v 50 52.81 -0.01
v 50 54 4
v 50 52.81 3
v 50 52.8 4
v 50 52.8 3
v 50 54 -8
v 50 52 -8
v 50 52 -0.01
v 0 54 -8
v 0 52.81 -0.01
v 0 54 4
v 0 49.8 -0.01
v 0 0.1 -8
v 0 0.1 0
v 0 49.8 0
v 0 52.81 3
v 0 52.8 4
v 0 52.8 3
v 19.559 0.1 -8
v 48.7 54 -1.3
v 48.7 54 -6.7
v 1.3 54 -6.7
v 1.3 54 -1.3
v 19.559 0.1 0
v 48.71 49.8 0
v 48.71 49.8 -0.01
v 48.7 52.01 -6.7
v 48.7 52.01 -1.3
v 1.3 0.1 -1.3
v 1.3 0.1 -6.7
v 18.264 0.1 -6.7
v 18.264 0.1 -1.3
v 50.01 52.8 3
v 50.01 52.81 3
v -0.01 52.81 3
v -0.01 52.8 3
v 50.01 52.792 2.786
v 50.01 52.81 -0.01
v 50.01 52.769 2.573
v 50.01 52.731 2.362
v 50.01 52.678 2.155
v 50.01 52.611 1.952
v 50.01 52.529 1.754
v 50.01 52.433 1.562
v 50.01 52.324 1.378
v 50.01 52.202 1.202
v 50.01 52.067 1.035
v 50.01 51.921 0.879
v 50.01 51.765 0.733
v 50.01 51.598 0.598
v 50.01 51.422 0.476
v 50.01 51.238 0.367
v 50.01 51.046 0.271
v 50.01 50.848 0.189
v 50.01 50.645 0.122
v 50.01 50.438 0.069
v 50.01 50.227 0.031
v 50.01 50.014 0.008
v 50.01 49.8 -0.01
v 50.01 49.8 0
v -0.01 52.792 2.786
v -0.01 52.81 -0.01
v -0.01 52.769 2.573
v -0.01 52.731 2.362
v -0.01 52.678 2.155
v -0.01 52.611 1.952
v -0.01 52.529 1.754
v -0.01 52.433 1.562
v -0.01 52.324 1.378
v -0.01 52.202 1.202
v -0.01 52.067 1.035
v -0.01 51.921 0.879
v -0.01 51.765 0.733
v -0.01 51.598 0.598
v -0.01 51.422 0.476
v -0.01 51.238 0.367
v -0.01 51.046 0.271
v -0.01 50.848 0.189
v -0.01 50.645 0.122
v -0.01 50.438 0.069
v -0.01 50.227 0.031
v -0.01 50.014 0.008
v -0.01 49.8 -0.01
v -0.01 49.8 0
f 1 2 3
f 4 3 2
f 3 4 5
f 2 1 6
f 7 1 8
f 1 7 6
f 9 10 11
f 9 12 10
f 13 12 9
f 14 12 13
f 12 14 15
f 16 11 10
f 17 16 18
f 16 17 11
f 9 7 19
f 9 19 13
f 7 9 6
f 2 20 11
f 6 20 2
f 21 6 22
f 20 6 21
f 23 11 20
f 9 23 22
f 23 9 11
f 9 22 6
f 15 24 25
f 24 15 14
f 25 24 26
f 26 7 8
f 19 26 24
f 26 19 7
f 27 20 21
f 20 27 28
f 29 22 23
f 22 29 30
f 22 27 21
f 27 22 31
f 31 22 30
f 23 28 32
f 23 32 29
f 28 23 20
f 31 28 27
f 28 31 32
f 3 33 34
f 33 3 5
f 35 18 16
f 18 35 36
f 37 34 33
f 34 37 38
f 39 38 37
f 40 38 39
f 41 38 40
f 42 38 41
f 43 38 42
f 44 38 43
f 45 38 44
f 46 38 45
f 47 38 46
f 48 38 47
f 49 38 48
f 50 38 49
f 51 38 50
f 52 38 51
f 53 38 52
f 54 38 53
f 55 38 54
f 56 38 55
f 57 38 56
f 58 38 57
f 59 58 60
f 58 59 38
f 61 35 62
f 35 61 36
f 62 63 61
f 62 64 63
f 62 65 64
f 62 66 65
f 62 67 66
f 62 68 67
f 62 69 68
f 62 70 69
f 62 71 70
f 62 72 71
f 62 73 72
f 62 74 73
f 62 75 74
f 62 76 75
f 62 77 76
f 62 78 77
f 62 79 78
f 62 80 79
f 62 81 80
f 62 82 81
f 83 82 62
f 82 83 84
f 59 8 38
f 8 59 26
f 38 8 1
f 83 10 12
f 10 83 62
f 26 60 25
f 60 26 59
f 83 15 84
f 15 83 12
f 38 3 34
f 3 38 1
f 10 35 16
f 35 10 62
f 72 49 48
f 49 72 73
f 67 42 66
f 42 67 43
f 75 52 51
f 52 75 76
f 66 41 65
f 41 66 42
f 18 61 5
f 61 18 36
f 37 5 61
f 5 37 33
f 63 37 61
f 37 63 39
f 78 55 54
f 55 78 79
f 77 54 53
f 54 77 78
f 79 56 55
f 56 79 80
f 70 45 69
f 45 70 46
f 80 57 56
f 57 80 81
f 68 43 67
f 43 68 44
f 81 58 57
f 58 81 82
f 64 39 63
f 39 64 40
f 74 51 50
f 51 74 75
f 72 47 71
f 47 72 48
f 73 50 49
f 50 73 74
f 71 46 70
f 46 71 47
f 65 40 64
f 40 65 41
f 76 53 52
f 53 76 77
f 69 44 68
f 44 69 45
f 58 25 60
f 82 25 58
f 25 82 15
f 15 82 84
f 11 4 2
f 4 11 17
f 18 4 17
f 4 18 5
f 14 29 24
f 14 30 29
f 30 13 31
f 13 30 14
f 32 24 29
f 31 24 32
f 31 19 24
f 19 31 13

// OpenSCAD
// file: duet3.scad
// duet3.scad
// controller board, simple model for mounting

// backside thru holes stick out 2.5 mm
// 4.3 radius clearance around the mounting holes for posts

// note the thermal vias mean the hot parts could be water cooled from
// the backside of the pcb, these are marked in pink

use <../Parts/tslot.scad>
use <../Parts/pi4.scad>


// locations for front rail of the shelf vs PCB zero
x0front=-30;
y0front=-20;


//----------------------------------
module duet3(
tol=0,
type=0
){
  
  // ---- PCB ----------
  difference(){
    // PCB,
    color("blue")
    cube([134+tol,140+tol,1.5+tol]);
    
    // mounting holes
    translate([4.5,4.5,-1])
    cylinder(r=4.2/2-tol/2,h=4,$fn=22);
    translate([4.5,140-4.5,-1])
    cylinder(r=4.2/2-tol/2,h=4,$fn=22);
    translate([134-4.5,4.5,-1])
    cylinder(r=4.2/2-tol/2,h=4,$fn=22);
    translate([134-4.5,140-4.5,-1])
    cylinder(r=4.2/2-tol/2,h=4,$fn=22);
  
  }
  
  // ------- driver connectors, tall enough to include wires
  translate([0,55,1.5])     // 0
  cube([11,16.5,21]);
  translate([0,84,1.5])     // 1
  cube([11,16.5,21]);
  translate([0,113,1.5])    // 2
  cube([11,16.5,21]);
  
  translate([32.5,55,1.5])     // 5
  cube([11,16.5,21]);
  translate([32.5,84,1.5])     // 4
  cube([11,16.5,21]);
  translate([32.5,113,1.5])    // 3
  cube([11,16.5,21]);

  // Out_x connectors
  translate([0,10,1.5])     // 3
  cube([11,8.5,21]);
  translate([0,22.3,1.5])     // 2
  cube([11,8.5,21]);
  translate([0,35.3,1.5])     // 1
  cube([11,8.5,21]);

  // ---------- bottom edge connectors
  translate([21,0,1.5])     // gnd v+
  cube([5.6,6.2,19]);
  color("red")
  translate([27.6,-0.3,1.5])     // reset button
  cube([4.6,4.6,2]);
  translate([34.4,0,1.5])     // external reset
  cube([5.6,6.2,19]);
  
  color("red")
  translate([47.8,0.5,1.5])     // SD card holder
  cube([15,15,2.3]);

  color("cyan")
  translate([48.6,-2.2,2.2])     // SD card holder
  cube([11.2,15.6,1.3]);
  
  color("red")
  translate([66.2,-0.5,1.5])     // micro USB type B
  cube([8.5,6,3.4]);
  
  color("red")
  translate([80.4,0.5,1.5])     // ethernet
  cube([16,21.5,13.5]);
  
  // --------- right corner I/O 0-8
  translate([99.3,0,1.5])     // i/o_0
  cube([6.5,13.2,19]);
  translate([109.3,0,1.5])     // i/o_1
  cube([6.5,13.2,19]);
  translate([118.5,0,1.5])     // i/o_2
  cube([6.5,13.2,19]);
  
  translate([99.3,14.5,1.5])     // i/o_3
  cube([6.5,13.2,19]);
  translate([109.3,14.5,1.5])     // i/o_4
  cube([6.5,13.2,19]);
  translate([118.5,14.5,1.5])     // i/o_5
  cube([6.5,13.2,19]);
  translate([127.8,14.5,1.5])     // i/o_6
  cube([6.5,13.2,19]);
  
  translate([118.5,28.6,1.5])     // i/o_7
  cube([6.5,13.2,19]);
  translate([127.8,28.6,1.5])     // i/o_8
  cube([6.5,13.2,19]);
  
  translate([111.2,28.6,1.5])     // DS_LED
  cube([6.5,10.2,19]);
  
  // ---------- ribbon cable
  color("green")
  translate([134-9.5,46,1.5])     // R-Pi ribbon
  cube([9.5,40.6,13.5]);
  
  color("red")
  translate([134-18.2,90,1.5])     // RJ45 for Canbus
  cube([18.2,14,13.3]);
  
  //------------ power block
  color("red")
  translate([65,122,1.5])     // Power block
  cube([58.5,16.2,18]);
  
  translate([65,115,1.5])     // fuse
  cube([15,6,18.5]);
  translate([96,115,1.5])     // fuse
  cube([15,6,18.5]);
  
  //-------- hot parts with thermal vias
  color("pink")
  translate([19,12,-0.2])     // Out_13D4184 40 volt N channel mosfet
  cube([7,6,2]);
  color("pink")
  translate([19,25,-0.2])     // Out_2 D4184 40 volt N channel mosfet
  cube([7,6,2]);
  color("pink")
  translate([19,37,-0.2])     // Out_1 D4184 40 volt N channel mosfet
  cube([7,6,2]);
  color("pink")
  
  translate([119.2,110.8,-0.2])     // Out_0 036N04L mosfet 40 volt 90 amp
  cube([6.5,6,2]);
  
  color("pink")
  translate([23.2,60.3,-0.2])     // Stepper driver 0, TMC 5160
  cube([5,5,2]);
  color("pink")
  translate([23.2,89.4,-0.2])     // Stepper driver 1
  cube([5,5,2]);
  color("pink")
  translate([23.2,118.5,-0.2])     // Stepper driver 2
  cube([5,5,2]);
  
  color("pink")
  translate([55.3,60.3,-0.2])     // Stepper driver 5
  cube([5,5,2]);
  color("pink")
  translate([55.3,89.4,-0.2])     // Stepper driver 4
  cube([5,5,2]);
  color("pink")
  translate([55.3,118.5,-0.2])     // Stepper driver 3
  cube([5,5,2]);
  
}
//---------------------------------
module duet3bracket(){
// this is the left side only, use a mirror to get right side

  difference(){
    // corners
    union(){
      color("pink")
      translate([-8,140-10,-4])
      cube([18,16,10]);

      color("green")
      translate([134-10,140-10,-4])
      cube([12,12,5.5]);

    }
    
    // cut out for the PCB
    tol=0.15;
    cube([134+tol,140+tol,1.5+tol]);

    // trim corner off bottom slot
    translate([11,109,-4])
    rotate([0,0,45])
    cube([20,20,11]);

    // trim corner off top slot
    translate([134-8,140-19,-4])
    rotate([0,0,45])
    cube([10,14,5.5]);
    
    // hole for M4x18 
    translate([129.5,135.5,-16.5])
    cylinder(r=2,h=18,$fn=22);

  }
  
  // left side vertical
  color("red")
  difference(){
    hull(){
      translate([-15,130,-24])
      cube([10,20,20]);

      color("green")
      translate([126,130,-14])
      cube([10,12,10]);
    }

    // hole for M4x18 
    translate([129.5,135.5,-16.5])
    cylinder(r=2,h=18,$fn=22);
    // cut a flat for M4 nylock 
    translate([123,129,-16.5])
    cube([14,14,5]);
    
    // indent the long walls 
    translate([-4,140,-24])
    rotate([1.7,85.8,0])
    cylinder(r1=3,r2=2,h=120,$fn=44);

    translate([12,140,-4])
    rotate([1.7,90,0])
    cylinder(r1=3,r2=2,h=104,$fn=44);

    translate([-4,150,-14])
    rotate([3,88,0])
    cylinder(r1=3,r2=2,h=120,$fn=44);

    translate([-4,130,-14])
    rotate([0,88,0])
    cylinder(r1=3,r2=2,h=120,$fn=44);

  }


  // foot
  difference(){
    translate([-16+1,130+1,-45+1])
    minkowski(){
      cube([10-2,30-2,65-2]);
      sphere(r=1,$fn=22);
    }

    // cut for back rail
    translate([x0front,y0front+30+120+15,-50])
    tslot1(type=1,len=100,tol=0.2);
    
    // cut for front M4 to rail
    translate([-20,145,11])
    rotate([0,90,0])
    cylinder(r=2,h=18,$fn=22);  

    // cut for back M4 to rail
    translate([-20,145,-35])
    rotate([0,90,0])
    cylinder(r=2,h=18,$fn=22);  

  }
}
//--------------------------------
module pi4bracket(){

  difference(){
    union(){
      // crossbar 
      color("cyan")
      translate([-8+1,-20+1,-45+1])
      minkowski(){
        cube([10-2,180-2,21-2]);
        sphere(r=1,$fn=22);
      }
      // extra base below the picase
      color("cyan")
      translate([-8,18,-35])
      cube([10,89+12,22]);
      // extra base below the posts
      color("blue")
      translate([-8,12,-26])
      cube([10,24,21]);
      // extra base below the posts
      color("blue")
      translate([-8,100,-26])
      cube([10,24,21]);
    }
    
    // cut for the posts
    post1(tol=0.15);
    
    // cut for M4x18 to back rail
    translate([-23,145,-35])
    rotate([0,90,0])
    cylinder(r=2,h=18,$fn=22);  

    // countersink for M4x18, otherwise not long enough
    translate([-5.5,145,-35])
    rotate([0,90,0])
    cylinder(r=7.5/2,h=7.6,$fn=22);  

    // cut for M4 to front rail
    translate([-23,-5,-35])
    rotate([0,90,0])
    cylinder(r=2,h=18,$fn=22);  

    // countersink for M4x18, otherwise not long enough
    translate([-5.5,-5,-35])
    rotate([0,90,0])
    cylinder(r=7.5/2,h=7.6,$fn=22);  
    
    // clearance for the ribbon cable
    translate([-2,52,-40])
    cube([4.5,55,40]);
    
  }
      
  
if(1){
  // front wall to hold picase
  difference(){
    color("green")
    translate([-6,18,-45])
    cube([24,89+12,5]);

    color("blue")
    translate([26,-6,-46])
    rotate([0,0,45])
    cube([30,30,8]);

    color("blue")
    translate([26,100,-46])
    rotate([0,0,45])
    cube([30,30,8]);
  }
}
  
}

//-----------------------------
module post1(tol=0){

    // back wall corner
  color("orange")
  translate([-8,18,-20])
  cube([65+tol,6+tol,9+tol]);
  color("orange")
  translate([-8,18,-14])
  cube([65+tol,12+tol,5+tol]);
  // tab to limit insertion
  color("pink")
  translate([2,12,-20])
  cube([6,6,11]);
    
}
//-------------------------------
module post2(tol=0){

  difference(){
    color("gray")
    translate([-8,113,-20])
    cube([65+tol,6+tol,9+tol]);
  
    color("blue")
    translate([20,111,-23])
    cube([20,16,5]);
  }
  color("pink")
  translate([-8,107,-14])
  cube([65+tol,12+tol,5+tol]);
  // tab to limit insertion
  color("orange")
  translate([2,118,-20])
  cube([6,6,11]);

}
//----------------------------------------------------------
module dcdc(tol=0){
  
  // main body
  difference(){
    cube([51.6+tol,28.3+tol,78.8+tol]);
    
    translate([-1,14,2.7])
    rotate([0,90,0])
    cylinder(r=1.5,h=8,$fn=22);
    translate([-1,14,69.3])
    rotate([0,90,0])
    cylinder(r=1.5,h=8,$fn=22);
    
  }
  // terminal block
  translate([10.2,10.3,78.7])
  cube([39.8,12.2,13.2]);
  translate([10.2,9.3,78.7+10.2])
  cube([39.8,12.2+2,3]);
  
}
//-------------------------------------------------------------
module dcbracket(tol=0){

difference(){
  translate([-15.5+1,-49+1,-59])
  minkowski(){
    cube([10.5-2,28-2,122]);
    sphere(1,$fn=88);
  }
  
  // cut for the dcdc
  translate([-5,-49,-44]){
    dcdc(tol=0.15);
    // cut for M3x10 to attach dcdc
    translate([-11,14,2.7])
    rotate([0,90,0])
    cylinder(r=1.55,h=18,$fn=22);
    translate([-11,14,69.3])
    rotate([0,90,0])
    cylinder(r=1.55,h=18,$fn=22);
    // clearance for M3x10 heads
    translate([-10.5,14,2.7])
    rotate([0,90,0])
    cylinder(r=3,h=3.5,$fn=22);
    translate([-10.5,14,69.3])
    rotate([0,90,0])
    cylinder(r=3,h=3.5,$fn=22);

  }
  
  // cut for top rail
  translate([x0front,y0front,-90])
  rotate([0,0,0])
  tslot1(type=2,len=160,tol=0.2);
  // cut for M4 to front rail
  translate([-23,-5-30,-51])
  rotate([0,90,0])
  cylinder(r=2,h=20,$fn=22);  
  translate([-23,-5-30,55])
  rotate([0,90,0])
  cylinder(r=2,h=20,$fn=22);  

}
}
//=================================

if(1){
translate([-5,-49,-44])
color("gray")
dcdc();
}

color("cyan")
dcbracket();

// missed by 2 mm when making the pi shelf
if(1){
translate([2,0,0]){
  post1();
  post2();
  pi4bracket();
}
}

if(1){
translate([58,112.75,-15])
rotate([0,180,90])
pi4case();
}

duet3();

duet3bracket();

if(1){
translate([0,140,0])
mirror([0,1,0])
duet3bracket();
}

if(1){
// top rail
translate([x0front,y0front,-90])
rotate([0,0,0])
tslot1(type=2,len=160);

// back rail
translate([x0front,y0front+30+120+15,-50])
rotate([0,0,0])
tslot1(type=1,len=100);
}
//=================================
// file: ../Parts/switch2.scad
//=================================================================================
// switch2.scad
// Model for pushbutton power cutoff switches
//
// Dr Tom Flint, 12 Dec 2020
//=================================================================================

//-------------------------------------------------------
module switch2(){

  // stack
  cylinder(r=11.85/2,h=16.5,$fn=88);
  translate([0,0,16.5])
  cylinder(r=8.76/2,h=4.2,$fn=88);
  translate([0,0,16.5+4.2])
  cylinder(r=10/2,h=6,$fn=88);

  // body
  translate([0,0,-5])
  cube([17,23.6,10],center=true);

  // wiring tabs
  color("red")
  translate([0,0,-19]){
    translate([2,-7.6/2,0])
    cube([4,7.6,9]);
    translate([-7.6/2,-11,0])
    cube([7.6,4,9]);
    translate([-7.6/2,7,0])
    cube([7.6,4,9]);
    
  }

}

//==================================================================================


switch2();


//==================================================================================
// file: ../Parts/pi4.scad
// pi4.scad
// 

use <../Parts/rounder.scad>

//---------------------
module pi4case(tol=0){

difference(){
  union(){
    // base block
    color("gray"){
      cube([88.2,56,4.3]);

      // feet on base block
      cube([6.9,6.6,7.5]);
      translate([58.5,0,0])
      cube([6.0,6.6,7.5]);
      translate([58.5,56-6.6,0])
      cube([6.0,6.6,7.5]);
      translate([0,56-6.6,0])
      cube([6.9,6.6,7.5]);
    }
    
    // pcb
    color("green")
    translate([0,0,7.5])
    cube([85,56,1.65]);

    // top block
    color("gray")
    translate([0,0,9.1])
    cube([70,56,15.5]);
  }

  // round the 4 corners
  rounder(r=2,h=25);
  translate([88.2,0,0])
  rotate([0,0,90])
  rounder(r=2,h=25);
  translate([88.2,56,0])
  rotate([0,0,180])
  rounder(r=2,h=25);
  translate([0,56,0])
  rotate([0,0,270])
  rounder(r=2,h=25);

  // cut for ethernet
  translate([65.25,36.8,9.1])
  cube([22,20,24]);

  // cut for ribbon cable
  translate([5.6,49,9.1])
  cube([54.5,8,24]);

  // cut for display cable
  translate([-0.1,17,15.7])
  cube([5.6,22,15]);

  // cut for camera cable
  translate([44,2.2,9.0])
  cube([4,17.8,20]);

}

// screw heads on bottom side stick out a bit
translate([3.3,3.3,-0.7])
cylinder(r=4.5/2,h=1,$fn=18);
translate([3.3,52.5,-0.7])
cylinder(r=4.5/2,h=1,$fn=18);
translate([62,3.3,-0.7])
cylinder(r=4.5/2,h=1,$fn=18);
translate([62,52.5,-0.7])
cylinder(r=4.5/2,h=1,$fn=18);

// usb host
translate([70.4,1.0,9.1])
cube([17.5,14.6,15.7]);
translate([70.4,21.5,9.1])
cube([17.5,14.6,15.7]);

// ethernet
translate([66.25,37.8,9.1])
cube([21,16,13.3]);

// ribbon cable
translate([6.3,49.5,9.1])
cube([52.5,6.3,14]);

// SD card, oversize so we get a single solid
color("red")
translate([-3,22.5,5.5])
cube([15,11.2,2]);

// USB power jack
translate([6.5,-1.5,9.1])
cube([9,5,3.25]);

// micro HDMI 0
translate([22.5,-1.5,9.1])
cube([7.3,5,3.6]);

// micro HDMI 1
translate([36.5,-1.5,9.1])
cube([7.3,5,3.6]);

// stereo out jack
translate([55,-2.5,9.1+3])
rotate([-90,0,0])
cylinder(r=3,h=5,$fn=19);

}

//==========================

pi4case();


//==========================
// file: ../Parts/rounder.scad
// rounder.scad
// cutting tool for rounding off corners with a cylinder

//---------------------
module rounder(
r=10,   // radius
h=10,   // height
f=22,    // $fn
extra=0.01  // extra size for the cube
){

difference(){
  translate([-extra,-extra,-extra])
  cube([r+extra,r+extra,h+2*extra]);
  translate([r,r,-1])
  cylinder(r=r,h=h+2,$fn=f);
}

}

//---------------------------------------------------------------------------
module bevel(x=1,y=1,h=10){

linear_extrude(height=h)
polygon(points=[[0,0],[x,0],[0,y]]);
    
}
  

//========================

rounder();

//========================
// file: ../Parts/tslot.scad
//=================================================================================
// tslot
// models for tslots used in PrusaDusa
// 
// Tom Flint, 2020
//=================================================================================
module tslot1(
tol = 0.0,
len = 60,
type = 1
){
    
// 30x30     
if(type==1){
    linear_extrude(height=len,convexity=10)
    difference(){
        offset(r=2.0+tol,$fn=20)
        square([26,26],center=true);
 
        translate([0,12,0])
        square([8.2-tol,8.2-tol],center=true);
        translate([0,-12,0])
        square([8.2-tol,8.2-tol],center=true);
        translate([12,0,0])
        square([8.2-tol,8.2-tol],center=true);
        translate([-12,0,0])
        square([8.2-tol,8.2-tol],center=true);
    }
}
    
// 30x60
if(type==2){
    linear_extrude(height=len,convexity=10)
    difference(){
        offset(r=2.0+tol,$fn=20)
        square([26,56],center=true);
 
        translate([0,27,0])
        square([8.2-tol,8.2-tol],center=true);
        translate([0,-27,0])
        square([8.2-tol,8.2-tol],center=true);
        
        translate([12,15,0])
        square([8.2-tol,8.2-tol],center=true);
        translate([-12,15,0])
        square([8.2-tol,8.2-tol],center=true);

        translate([12,-15,0])
        square([8.2-tol,8.2-tol],center=true);
        translate([-12,-15,0])
        square([8.2-tol,8.2-tol],center=true);
    }
}
    
// 36x60
if(type==3){
    linear_extrude(height=len,convexity=10)
    difference(){
        offset(r=2.0+tol,$fn=20)
        square([56,56],center=true);
 
        translate([15,27,0])
        square([8.2-tol,8.2-tol],center=true);
        translate([15,-27,0])
        square([8.2-tol,8.2-tol],center=true);
        
        translate([-15,27,0])
        square([8.2-tol,8.2-tol],center=true);
        translate([-15,-27,0])
        square([8.2-tol,8.2-tol],center=true);
        
        translate([27,15,0])
        square([8.2-tol,8.2-tol],center=true);
        translate([-27,15,0])
        square([8.2-tol,8.2-tol],center=true);

        translate([27,-15,0])
        square([8.2-tol,8.2-tol],center=true);
        translate([-27,-15,0])
        square([8.2-tol,8.2-tol],center=true);
    }
}
    
}

//--------------------------------------
module tbrace(
tol=0.0
){

F2=22;
 
translate([0,0,2-15])    
difference(){    
union(){
        cube([4.8,60,26]);
        cube([60,4.8,26]);
    
    hull(){
        translate([60-2.4,4.8,0])
        cylinder(r=2.4,h=26,$fn=F2);
        translate([4.8,60-2.4,0])
        cylinder(r=2.4,h=26,$fn=F2);
    }
}    

        translate([15,0,26/2])
        rotate([-90,0,0])
        cylinder(r1=3.5,r2=4.5,h=60,$fn=F2);
        translate([15+30,0,26/2])
        rotate([-90,0,0])
        cylinder(r1=3.5,r2=4.5,h=60,$fn=F2);

        translate([0,15,26/2])
        rotate([0,90,0])
        cylinder(r1=3.5,r2=4.5,h=60,$fn=F2);
        translate([0,15+30,26/2])
        rotate([0,90,0])
        cylinder(r1=3.5,r2=4.5,h=60,$fn=F2);

}
}

//----------------------------------------
module lbrace(
tol=0,
holes=0,
nuts=1
){

F2=22;
    
pts1=[ [5,0], [80,0], [85,5], [85,22], [80,28],
    [28,28], [28,80], [22,85], [5,85], [0,80], [0,5] ];
    
if(holes==1){
    difference(){
        linear_extrude(height=3.25+tol,convexity=10)
        offset(r=tol)
        polygon(points=pts1);
        
        translate([16+30,14,-1])
        cylinder(r=3.25,h=5,$fn=F2);
        translate([16+60,14,-1])
        cylinder(r=3.25,h=5,$fn=F2);

        translate([14,16+30,-1])
        cylinder(r=3.25,h=5,$fn=F2);
        translate([14,16+60,-1])
        cylinder(r=3.25,h=5,$fn=F2);
    }
}else{
        linear_extrude(height=3.25+tol,convexity=10)
        offset(r=tol)
        polygon(points=pts1);
}

if(nuts==1){
    
        translate([16+30,14,0])
        cylinder(r=5,h=6+3.25,$fn=F2);
        translate([16+60,14,0])
        cylinder(r=5,h=6+3.25,$fn=F2);

        translate([14,16+30,0])
        cylinder(r=5,h=6+3.25,$fn=F2);
        translate([14,16+60,0])
        cylinder(r=5,h=6+3.25,$fn=F2);
}

}


//=======================================

lbrace();

translate([50,50,0])
lbrace(tol=0.2);

//tbrace();

/*
color("cyan")
tslot1(len=70);

color("green")
translate([0,15,0])
tslot1(type=2);

color("red")
translate([15,15,0])
tslot1(type=3,len=50);

*/

//=======================================
// main file
// topshelf.scad
// all the stuff that attaches to the top shelf

use <../Parts/tslot.scad>
use <../Parts/rounder.scad>
use <../Parts/pi4.scad>
use <../Parts/switch2.scad>

use <duet3.scad>

// Length front, back, top rail
x1=480;         

// Length side rails
y1=330;      

// Length of towers 
z1=380;       

// Length of side rails
y5=120;

x2=x1/2;
y2=y1/2;
yoff=-62;       // tower and top offset from center

// fan and radiator
t1=4.25;   // thickness box intake side
t2=17.7;   // thickness of circular section
t3=4.0;    // thickness box outlet side
t4=t1+t2+t3;

tB=5.5;     // thickness radiator bracket

//--------------------------------
module topshelf(tol=0){

    // left tower
    translate([x2-30,yoff,15])
    rotate([0,0,0])
    tslot1(type=3,len=z1);

    // right tower
    translate([-x2+30,yoff,15])
    rotate([0,0,0])
    tslot1(type=3,len=z1);

    // top rail
    translate([-x2,yoff,15+z1+15])
    rotate([0,90,0])
    tslot1(type=2,len=x1);

    // left side rail
    translate([x2-15,yoff-30,15+z1+15])
    rotate([0,90,-90])
    tslot1(type=1,len=120);
    
    // left side rail
    translate([-x2+15,yoff-30,15+z1+15])
    rotate([0,90,-90])
    tslot1(type=1,len=120);
    
    // back rail
    translate([-x2,yoff-165,15+z1+15])
    rotate([0,90,0])
    tslot1(type=1,len=x1);

    //---------- triangle corners shelf ---------------

    // left shelf corner
    color("red")
    translate([x2-15,yoff-30,z1+15])
    rotate([-90,0,-90])
    tbrace();

    // right shelf corner
    color("green")
    translate([-x2+15,yoff-30,z1+15])
    rotate([-90,0,-90])
    tbrace();
    
    //---------- L braces shelf ------------------

    // tower to shelf left
    color("gray")
    translate([x2,yoff,z1+45])
    rotate([-90,0,-90])
    lbrace();
    
    // tower to shelf right
    color("gray")
    translate([-x2,yoff,z1+45])
    rotate([90,90,-90])
    lbrace();
    
    // left side rail to back rail
    color("gray")
    translate([x2,yoff-180,z1+15])
    rotate([0,180,0])
    lbrace();
    
    // right side rail to back rail
    color("gray")
    translate([-x2,yoff-180,z1+15])
    rotate([0,180,-90])
    lbrace();

}

//-------------------------------------------------------
module brace(){
  intersection(){
    rotate([0,-90,0])
    difference(){ 
      cylinder(r=7.8,h=t4,$fn=22);
      cylinder(r=5.5,h=t4,$fn=22);
    } 
    translate([-t4,-2,-2])
    cube([ t4,12,12]);
  }
}
  
//---------------------------------------------
module fan(tol=0){

 
  // Fan body
  translate([-t1,0,0])
  cube([t1+tol,121+tol,120+tol]);
  translate([-(t1+t2),60,60])
  rotate([0,90,0])
  cylinder(r=60,h=t2,$fn=88);  
  translate([-t4,0,0])
  cube([t3+tol,120+tol,120+tol]);

  // Corner screws
  translate([0,7,7])
  rotate([0,-90,0])
  cylinder(r=1.45,h=t4,$fn=22);

  translate([0,120-7,7])    // double up to tolerate offset errors
  rotate([0,-90,0])
  cylinder(r=1.6,h=t4,$fn=22);
  translate([0,120-7.5,7])
  rotate([0,-90,0])
  cylinder(r=1.6,h=t4,$fn=22);

  translate([0,7,120-7])
  rotate([0,-90,0])
  cylinder(r=1.45,h=t4,$fn=22);
  translate([0,120-7,120-7])
  rotate([0,-90,0])
  cylinder(r=1.45,h=t4,$fn=22);

  // Corner braces
  translate([0,7,7])
  brace();
  translate([0,120-7,7])
  rotate([90,0,0])
  brace();
  translate([0,120-7,120-7])
  rotate([180,0,0])
  brace();
  translate([0,7,120-7])
  rotate([-90,0,0])
  brace();

  // reminder for wiring
  color("red")
  translate([0,120-7,15.5])
  scale([1,4,1])
  rotate([0,90,0])
  cylinder(r=0.7,h=10,$fn=22);
}

//-------------------------------------------------
module radiator(tol=0){
  // fan
  fan(tol=tol);
  
  // radiator main box, holes on backside are accurate location
  difference(){
    translate([-(t4+32.5),-5.5,0])
    cube([32.5+tol,129+tol,120+tol]);

    translate([-t4-10,10.7-5.5,8])
    rotate([0,-90,0])
    cylinder(r=1.5,h=35,$fn=33);
    translate([-t4-10,116-5.5,8])
    rotate([0,-90,0])
    cylinder(r=1.5,h=35,$fn=33);
  }
    
  // short side
  color("cyan")
  translate([-(t4+29.5-4),-14+4,3+4])
  minkowski(){
    cube([26-8,20-8,114-8]);
    sphere(r=4,$fn=44);
  }
  
  // long side - actually more rounded than this model
  // also this side may stick out a bit more or less, not exact
  color("cyan")
  translate([-(t4+29.5-4),117,3+4])
  minkowski(){
    cube([26-8,30-8,114-8]);
    sphere(r=4,$fn=44);
  }
  
  // approximate locations only!
  translate([-t4-10,132,25])
  rotate([0,90,0])
  cylinder(r=5,h=35,$fn=33);
  translate([-t4-10,132,92])
  rotate([0,90,0])
  cylinder(r=5,h=35,$fn=33);
  
  
}

//-----------------------------------------------------------
module radiatorBracket1(){

  // main attach
  difference(){
    union(){
      translate([-(t4+32.5+6.2),-12,-tB])
      cube([t4+32.5+12,24,tB+2]);
      translate([-(t1+t2+-0.5),4,0])
      cube([t2-1,7,10]);
    }
    radiator(tol=0.2);
    
    // back rail
    translate([-70,0,-20])
    rotate([0,90,0])
    tslot1(type=1,len=x1,tol=0.2);
    
    // M4 screw for rail attach
    translate([-12,0,-20])
    cylinder(r=2,h=25,$fn=33);
    translate([-12,0,0])
    cylinder(r=7.2/2,h=4.3,$fn=33);

  }

  // backside screw attach
  difference(){
    translate([-(t4+32.5+6.2),-12,0])
    cube([6,24,14]);

    // trim corner
    translate([-(t4+32.5+6.5),-12,3])
    rotate([45,0,0])
    cube([8,16,12]);
    
    translate([-t4-10,10.7-5.5,8])
    rotate([0,-90,0])
    cylinder(r=1.5,h=35,$fn=33);
    // countersink
    translate([-t4-35,10.7-5.5,8])
    rotate([0,-90,0])
    cylinder(r=3.3,h=5,$fn=33);
  }
  
}    

//-----------------------------------------------------------
module radiatorBracket2(){

  // main attach
  difference(){
    union(){
      // main base
      translate([-(t4+32.5+6.2),104,-tB])
      cube([t4+32.5+12,116,tB+2]);
      // extra base under pump
      color("pink")
      translate([-(t4+32.5+6.2),144-5,-tB])
      cube([80,76+5,tB+16]);
      // tab for radiator front
      translate([-(t1+t2+-0.5),110,0])
      cube([t2-1,7,10]);
      // backside radiator screw attach
      translate([-(t4+32.5+6.2),104,0])
      cube([6,40,16]);
    }
    // cut for radiator
    radiator(tol=0.25);
  
    // cut for pump and foam anti-vibration pads
    translate([-62,147-5.1,0])
    cube([65+10.2,65+10.2,30]);

    // cut for radiator clearance
    translate([-58.65,140-5,2])
    cube([35,10,30]);
    
    // top rail
    translate([-70,120+45,-20])
    rotate([0,90,0])
    tslot1(type=2,len=x1,tol=0.2);
   
    // cut for side rail
    translate([-70,100,-tB-1.3])
    cube([80,40,2]);
       
    // round off pump corners
    translate([-64.8,220,-5.5])
    rotate([0,0,-90])
    rounder(r=2,h=30,f=88);
    translate([15.4,220,-5.5])
    rotate([0,0,180])
    rounder(r=2,h=30,f=88);
    translate([15.4,144-5,-5.5])
    rotate([0,0,90])
    rounder(r=2,h=30,f=88);
   
    // M4 screw for rail attach
    translate([-10,120+30,-20])
    cylinder(r=2,h=25,$fn=33);
    translate([-10,120+30,-1])
    cylinder(r=7.2/2,h=24.3,$fn=33);

    // M4 screw for rail attach
    translate([-50,120+60,-20])
    cylinder(r=2,h=25,$fn=33);
    translate([-50,120+60,-1])
    cylinder(r=7.2/2,h=4.3,$fn=33);

    // screw on back of radiator
    translate([-t4-10,116-5.5,8])
    rotate([0,-90,0])
    cylinder(r=1.5,h=35,$fn=33);
    
   // countersink
    translate([-t4-35,116-5.5,8])
    rotate([0,-90,0])
    cylinder(r=3.3,h=5,$fn=33);

    // trim corner near radiator screw
    translate([-t4-40,103,9])
    rotate([45,0,0])
    cube([8,14,14]);
    
    // material reduction, cut out some baseplate under the pump
    translate([-35,163,-10])
    minkowski(){
      cube([30,40,20]);
      cylinder(r=4,h=20,$fn=44);
    }
    
  }  // end of difference
  
  // extra brace on pump surround near radiator outlet
  translate([0.3,120,0])
  difference(){
    cube([5.5,20,16]);
    translate([-1,0,2])
    rotate([45,0,0])
    cube([8,22,22]);
  }  
  
  
  // text label
  color("red")
    translate([-26,218.6,6])
  rotate([90,0,180])
  linear_extrude(height=2,scale=1)
  text("SUPERCOOL", font = "Open Sans:style=Bold", size=7,halign="center",valign="center",spacing=1.1);
  
}    

//-----------------------------------------------------------
module pump(tol=0){

  // box
  translate([-62+5.1-tol/2,147-tol/2,0]){
    cube([64.8+tol,64.8+tol,56]);
    // reservoir
    translate([32,32,56])
    cylinder(r=30,h=59,$fn=88);
  }

}    

//-------------------------------------------------------
module reelAxle(tol=0){
  
  // main shaft with 1 flat side
  difference(){
    cylinder(r=7.65/2+tol/2,h=127.9+tol,$fn=88);
    translate([2.775,-4,-1])
    cube([8,8,130]);
  }
  
  // box at lower end
  translate([-6.8,-7.8/2,0])
  cube([6.8,7.8,5.4]);

  // ramp on box end
  difference(){
    color("cyan")
    translate([-6.8,-5.25,0])
    rotate([0,0,45])
    cube([7.5,7.5,5.4]);

    color("gray")
    translate([-21.8,-7.5,-1])
    cube([15,15,7]);
  }
  
  // ridges on sides of box
  color("pink")
  translate([-6.8,-3.3,2.7])
  rotate([0,90,0])
  scale([1,2,1]){
    cylinder(r1=1.1,r2=1,h=7.3,$fn=22);
    translate([0,0,7.29])
    cylinder(r2=0.7,r1=1,h=2.27,$fn=22);
  }

  color("orange")
  translate([-6.8,3.3,2.7])
  rotate([0,90,0])
  scale([1,2,1]){
    cylinder(r=1,h=7.3,$fn=22);
    translate([0,0,7.29])
    cylinder(r2=0.7,r1=1,h=2.27,$fn=22);
  }

}
//-------------------------------------------
// axle box for the active side
module axleBoxA(){
  
  difference(){
    translate([0,0,2])
    cube([13,16,10],center=true);

    reelAxle(tol=0.15);
    
    translate([-4,0,6])
    cube([7.7,7.8,4],center=true);
    
  }
  
}
//-------------------------------------------
// axle box for the passive side
module axleBoxP(){
  
  difference(){
    translate([-2,0,2])
    cube([13+4,16,10],center=true);

    hull(){
      translate([0,0,-5])
      cylinder(r=7.8/2,h=20,$fn=88);
      translate([-4,0,-5])
      cylinder(r=7.8/2,h=20,$fn=88);
    }
    
    // round off top edges
    translate([-10.5,-8,-6])
    rounder(r=4,h=20,f=44);
    translate([-10.5,8,-6])
    rotate([0,0,-90])
    rounder(r=4,h=20,f=44);
  }
  
}
//----------------------------------------
module reelPlus(){

// model reel and rewinder hub
h1=1.2;   // axle sticking out of the hub
h2=16.3;  // knobby adjustment wheel with clutch and spring
h3=5;     // thickness of reel sides
h4=46+0;    // width of hub fiber part
h5=h1+h2+h3+h4+h3;  // total height to the wingnuts
h6=16;    // thickness of wingnuts
  
  // adjustable side of hub
  color("red")
  cylinder(r=11.9/2,h=h1,$fn=22);
  
  color("gray"){
  translate([0,0,h1])
  cylinder(r=105/2,h=h2,$fn=88);

  // main reel
  translate([0,0,h1+h2])
  cylinder(r=200/2,h=h3,$fn=88);
  translate([0,0,h1+h2+h3])
  cylinder(r=150/2,h=h4,$fn=88);
  translate([0,0,h1+h2+h3+h4])
  cylinder(r=200/2,h=h3,$fn=88);
  
  // wing nuts
  translate([0,0,h5])
  cylinder(r=42,h=h6,$fn=88);
  // threaded shaft
  translate([0,0,h1])
  cylinder(r=30/2,h=108-h1,$fn=88);
  }
  
  // add the axle
  color("orange")
  translate([0,0,-6.5])
  reelAxle();

  
}
//-----------------------------------------------------------------------------
module reelLegs(){

  difference(){
    //color("cyan")
    union(){
      hull(){
        // tab near axle
        translate([-9.5,6,0])
        rotate([0,90,0])
        cylinder(r=6.8,h=10,$fn=89);
        // tab on front rail
        translate([-9.5,63,-85.5])
        cube([10,25,8]);
      }
      hull(){  
        // tab near axle
        translate([-9.5,-6,0])
        rotate([0,90,0])
        cylinder(r=6.8,h=10,$fn=89);
        // tab on back rail
        translate([-9.5,-87,-85.5])
        cube([10,25,8]);
      }
      // crossbrace
      translate([-9.5,-50,-55])
      cube([10,100,10]);
      
      // top crossbrace fillet
      translate([-9.5,-10,-10])
      cube([10,20,10]);
      
      // front crossbrace fillet
      translate([-9.5,33,-53])
      rotate([60,0,0])
      cube([10,10,10]);
      
      // back crossbrace fillet
      translate([-9.5,-33,-53])
      rotate([30,0,0])
      cube([10,10,10]);
      
      // front foot
      translate([-9.5,63,-85.5])
      cube([20,25,8]);
      translate([-2.4,63,-78.5])
      rotate([0,45,0])
      cube([4,23,4]);

      // back foot
      translate([-9.5,-87,-85.5])
      cube([20,25,8]);
      translate([-2.4,-87+2,-78.5])
      rotate([0,45,0])
      cube([4,23,4]);
    
    }  // end of union
     
    // cut for the axlebox
    translate([-4.5,0,3.5])
    cube([12,16,20],center=true);

    // cuts for the rails
    // undo the translate for reelBracket
    translate([0,-(yoff-90),-(z1+130)]){
      // top rail
      translate([-x2,yoff,15+z1+15])
      rotate([0,90,0])
      tslot1(type=2,len=x1,tol=0.2);
        
      // back rail
      translate([-x2,yoff-165,15+z1+15])
      rotate([0,90,0])
      tslot1(type=1,len=x1,tol=0.2);
    }
    
    // M4 screws for rail attach
    translate([6,60+15,-90])
    cylinder(r=2,h=20,$fn=22);
    translate([6,-(60+15),-90])
    cylinder(r=2,h=20,$fn=22);
    
    // M3x20 screws in front foot to prevent layers delaminating
    // use M3x40 when joining center pair
    translate([-6.5,(60+8),-81])   // screw
    rotate([0,90,0])
    cylinder(r=1.5,h=20,$fn=22);
    translate([-9.6,(60+8),-81])   // countersink
    rotate([0,90,0])
    cylinder(r=3,h=3.1,$fn=22);
    translate([-6.5,(60+22),-81])   // screw
    rotate([0,90,0])
    cylinder(r=1.5,h=20,$fn=22);
    translate([-9.6,(60+22),-81])   // countersink
    rotate([0,90,0])
    cylinder(r=3,h=3.1,$fn=22);
    
    // M3x20 screws in back foot to prevent layers delaminating
    // use M3x40 when joining center pair
    translate([-6.5,-(60+8),-81])   // screw
    rotate([0,90,0])
    cylinder(r=1.5,h=20,$fn=22);
    translate([-9.6,-(60+8),-81])   // countersink
    rotate([0,90,0])
    cylinder(r=3,h=3.1,$fn=22);
    translate([-6.5,-(60+22),-81])   // screw
    rotate([0,90,0])
    cylinder(r=1.5,h=20,$fn=22);
    translate([-9.6,-(60+22),-81])   // countersink
    rotate([0,90,0])
    cylinder(r=3,h=3.1,$fn=22);
    
    
    // holes for raw fiber to bind 2 center legs together
    translate([-11,9,-8]) // upper front
    rotate([0,90,0])
    cylinder(r=1,h=20,$fn=77); 
    translate([-11,-9,-8]) // upper back
    rotate([0,90,0])
    cylinder(r=1,h=20,$fn=77); 
    translate([-11,30,-44]) // middle front
    rotate([0,90,0])
    cylinder(r=1,h=20,$fn=77); 
    translate([-11,-30,-44]) // middle back
    rotate([0,90,0])
    cylinder(r=1,h=20,$fn=77); 
    
    // front material reduction, create ribs
    hull(){
      translate([-7,12,-12]) // upper inside
      rotate([0,90,0])
      cylinder(r1=1,r2=2,h=8,$fn=77); 
      translate([-7,61,-72])  // lower inside
      rotate([0,90,0])
      cylinder(r1=3,r2=4,h=8,$fn=77);
    }
    hull(){
      translate([-7,13,-4])  // upper outside
      rotate([0,90,0])
      cylinder(r1=1,r2=2,h=8,$fn=77);
      translate([-7,74,-72])   // lower outside
      rotate([0,90,0])
      cylinder(r1=3,r2=4,h=8,$fn=77);
    }

    // back material reduction, create ribs
    hull(){
      translate([-7,-12,-12]) // upper inside
      rotate([0,90,0])
      cylinder(r1=1,r2=2,h=8,$fn=77); 
      translate([-7,-61,-72])  // lower inside
      rotate([0,90,0])
      cylinder(r1=3,r2=4,h=8,$fn=77);
    }
    hull(){
      translate([-7,-13,-4])  // upper outside
      rotate([0,90,0])
      cylinder(r1=1,r2=2,h=8,$fn=77);
      translate([-7,-74,-72])   // lower outside
      rotate([0,90,0])
      cylinder(r1=3,r2=4,h=8,$fn=77);
    }

    // crossbar material reduction, create ribs
    hull(){
      translate([-7,31,-50])  // front
      rotate([0,90,0])
      cylinder(r1=2,r2=3,h=8,$fn=77); 
      translate([-7,-31,-50])   // back
      rotate([0,90,0])
      cylinder(r1=2,r2=3,h=8,$fn=77); 
    }




  }

}

//-----------------------------------------------------------------------------
// increase height to keep reels inside box
module reelLegs2(){

  difference(){
    //color("cyan")
    union(){
      hull(){
        // tab near axle
        translate([-9.5,6,20])
        rotate([0,90,0])
        cylinder(r=6.8,h=10,$fn=89);
        // tab on front rail
        translate([-9.5,63,-85.5])
        cube([10,25,8]);
      }
      hull(){  
        // tab near axle
        translate([-9.5,-6,20])
        rotate([0,90,0])
        cylinder(r=6.8,h=10,$fn=89);
        // tab on back rail
        translate([-9.5,-87,-85.5])
        cube([10,25,8]);
      }
      
      // crossbrace
      translate([-9.5,-50,-45])
      cube([10,100,10]);
      
      // top crossbrace fillet
      translate([-9.5,-10,10])
      cube([10,20,10]);
      
      // front crossbrace fillet
      translate([-9.5,33,-43])
      rotate([60,0,0])
      cube([10,10,10]);
      
      // back crossbrace fillet
      translate([-9.5,-33,-43])
      rotate([30,0,0])
      cube([10,10,10]);
      
      // front foot
      translate([-9.5,63,-85.5])
      cube([20,25,8]);
      translate([-2.4,63,-78.5])
      rotate([0,45,0])
      cube([4,23,4]);

      // back foot
      translate([-9.5,-87,-85.5])
      cube([20,25,8]);
      translate([-2.4,-87+2,-78.5])
      rotate([0,45,0])
      cube([4,23,4]);
    
    }  // end of union
     
    // cut for the axlebox
    translate([-4.5,0,3.5+20])
    cube([12,16,20],center=true);

    // cuts for the rails
    // undo the translate for reelBracket
    translate([0,-(yoff-90),-(z1+130)]){
      // top rail
      translate([-x2,yoff,15+z1+15])
      rotate([0,90,0])
      tslot1(type=2,len=x1,tol=0.2);
        
      // back rail
      translate([-x2,yoff-165,15+z1+15])
      rotate([0,90,0])
      tslot1(type=1,len=x1,tol=0.2);
    }
    
    // M4 screws for rail attach
    translate([6,60+15,-90])
    cylinder(r=2,h=20,$fn=22);
    translate([6,-(60+15),-90])
    cylinder(r=2,h=20,$fn=22);
    
    // M3x20 screws in front foot to prevent layers delaminating
    // use M3x40 when joining center pair
    translate([-6.5,(60+8),-81])   // screw
    rotate([0,90,0])
    cylinder(r=1.5,h=20,$fn=22);
    translate([-9.6,(60+8),-81])   // countersink
    rotate([0,90,0])
    cylinder(r=3,h=3.1,$fn=22);
    translate([-6.5,(60+22),-81])   // screw
    rotate([0,90,0])
    cylinder(r=1.5,h=20,$fn=22);
    translate([-9.6,(60+22),-81])   // countersink
    rotate([0,90,0])
    cylinder(r=3,h=3.1,$fn=22);
    
    // M3x20 screws in back foot to prevent layers delaminating
    // use M3x40 when joining center pair
    translate([-6.5,-(60+8),-81])   // screw
    rotate([0,90,0])
    cylinder(r=1.5,h=20,$fn=22);
    translate([-9.6,-(60+8),-81])   // countersink
    rotate([0,90,0])
    cylinder(r=3,h=3.1,$fn=22);
    translate([-6.5,-(60+22),-81])   // screw
    rotate([0,90,0])
    cylinder(r=1.5,h=20,$fn=22);
    translate([-9.6,-(60+22),-81])   // countersink
    rotate([0,90,0])
    cylinder(r=3,h=3.1,$fn=22);
    
    
    // front material reduction, create ribs
    hull(){
      translate([-7,12,-12+20]) // upper inside
      rotate([0,90,0])
      cylinder(r1=1,r2=2,h=8,$fn=77); 
      translate([-7,61,-72])  // lower inside
      rotate([0,90,0])
      cylinder(r1=3,r2=4,h=8,$fn=77);
    }
    hull(){
      translate([-7,13,-4+20])  // upper outside
      rotate([0,90,0])
      cylinder(r1=1,r2=2,h=8,$fn=77);
      translate([-7,74,-72])   // lower outside
      rotate([0,90,0])
      cylinder(r1=3,r2=4,h=8,$fn=77);
    }

    // back material reduction, create ribs
    hull(){
      translate([-7,-12,-12+20]) // upper inside
      rotate([0,90,0])
      cylinder(r1=1,r2=2,h=8,$fn=77); 
      translate([-7,-61,-72])  // lower inside
      rotate([0,90,0])
      cylinder(r1=3,r2=4,h=8,$fn=77);
    }
    hull(){
      translate([-7,-13,-4+20])  // upper outside
      rotate([0,90,0])
      cylinder(r1=1,r2=2,h=8,$fn=77);
      translate([-7,-74,-72])   // lower outside
      rotate([0,90,0])
      cylinder(r1=3,r2=4,h=8,$fn=77);
    }

    // crossbar material reduction, create ribs
    hull(){
      translate([-7,31,-50+10])  // front
      rotate([0,90,0])
      cylinder(r1=2,r2=3,h=8,$fn=77); 
      translate([-7,-31,-50+10])   // back
      rotate([0,90,0])
      cylinder(r1=2,r2=3,h=8,$fn=77); 
    }




  }

}
//-----------------------------------------
module reelBracket1(){
  
  // active box
  rotate([0,90,0])
  translate([0,0,-6.5])
  axleBoxA();
  
  // legs 
  reelLegs();
 
}
//-----------------------------------------
module reelBracket2(){
  
  // passive box
  rotate([0,90,0])
  translate([0,0,-6.5+9.0])
  axleBoxP();
  
  // legs 
  mirror([1,0,0])
  reelLegs();
 
}
//-----------------------------------------
// increase height to keep reel inside box
module reelBracket3(){
  
  // active box
  rotate([0,90,0])
  translate([-20,0,-6.5])
  axleBoxA();
  
  // legs 
  reelLegs2();
 
}
//-----------------------------------------
// increase height to keep reel inside box
module reelBracket4(){
  
  // passive box
  rotate([0,90,0])
  translate([-20,0,-6.5+9.0])
  axleBoxP();
  
  // legs 
  mirror([1,0,0])
  reelLegs2();
 
}


//-----------------------------------------
module estop(){
  
  difference(){
    hull(){
      // base
      translate([0,0,-1])
      linear_extrude(height=2)
      offset(r=5,$fn=200)
      square([50,50], center=true);

 
      // top plate
      translate([0,0,40])
      cylinder(r=20,h=3,$fn=200);
    
    }

    // top rail
    color("cyan")
    translate([-30,0,-15])
    rotate([0,90,0])
    tslot1(type=2,len=60);

    // cut for switch barrel
    translate([0,0,-10])
    cylinder(r=6,h=60,$fn=88);
    
    // cut for switch body
    translate([0,0,-10])
    cylinder(r1=25,r2=16,h=47,$fn=200);
    
    // cut for bolts
    translate([-25,15,-10])
    cylinder(r=2,h=80,$fn=44);
    translate([25,-15,-10])
    cylinder(r=2,h=80,$fn=44);

    // Cut for the bolt head, use also for support
    translate([-25,15,6])
    cylinder(r=4,h=39,$fn=44);
    translate([25,-15,6])
    cylinder(r=4,h=39,$fn=44);
    
    // cut for the wires
    hull(){
      translate([0,0,17])
      rotate([90,0,0])
      cylinder(r=6,h=40,$fn=200);
      rotate([90,0,0])
      cylinder(r=12,h=40,$fn=200);
    }
    
    // cross section cut
    if(0){
      translate([0,0,-40])
      cube([200,200,200]);
    }
      
  }
  

}

//-----------------------------------------------------------
// support for printing the estop 
module estop_sup(){
    // Cut for the bolt head, use also for support
    translate([-25,15,6])
    cylinder(r=4,h=39,$fn=44);
    translate([25,-15,6])
    cylinder(r=4,h=39,$fn=44);
}

//----------------------------------------------------------------
module estop_topa(){

    difference(){
      // top plate
      cylinder(r1=20,r2=18,h=2,$fn=200);
      // cut for switch barrel
      translate([0,0,-10])
      cylinder(r=6,h=60,$fn=88);
    }
    
  }
//----------------------------------------------------------------
module estop_topb(){
      color("red")
      translate([0,-14,2])
      linear_extrude(height=0.6,scale=1)
      text("S", font = "Open Sans:style=Bold", size=7,halign="center",valign="center",spacing=1.1);

      color("red")
      rotate([0,0,35])
      translate([0,-14,2])
      linear_extrude(height=0.6,scale=1)
      text("T", font = "Open Sans:style=Bold", size=7,halign="center",valign="center",spacing=1.1);

      color("red")
      rotate([0,0,70])
      translate([0,-14,2])
      linear_extrude(height=0.6,scale=1)
      text("O", font = "Open Sans:style=Bold", size=7,halign="center",valign="center",spacing=1.1);

      color("red")
      rotate([0,0,105])
      translate([0,-14,2])
      linear_extrude(height=0.6,scale=1)
      text("P", font = "Open Sans:style=Bold", size=7,halign="center",valign="center",spacing=1.1);

}

//----------------------------------------------------------------------------------
// 12" x 12" x 3mm blanks = 304.8 mm x 304.8 mm x 3 mm
// Actual size 299 mm square, 3 mm thick.
module dryBox(){

x0=280;
y0=230;
z0=110;
c0=40;

z1=2*z0;

  // base
  color("silver")
  translate([0,0,1.5])
  cube([x0,y0,3],center=true);

if(1){
  // left side
  translate([-x0/2+1.5,0,z0+1.5])
  cube([3,y0-6,z1-3],center=true);
}
  
  // right side
  translate([x0/2-1.5,0,z0+1.5])
  cube([3,y0-6,z1-3],center=true);

if(0){
  // front side
  color("cyan")
  translate([0,-y0/2+1.5,z0+1.5])
  cube([x0,3,z1-3],center=true);
}

  // back side
  color("green")
  translate([0,y0/2-1.5,z0+1.5])
  cube([x0,3,z1-3],center=true);
  
  // center wall
  if(1){
    color("pink")
    translate([0,0,z0+1.5-c0/2])
    cube([3,y0-6,c0],center=true);
  }
  
  // center mount for reels
  color("cyan")
  centerBlock();
  
  // end mount for reels
  color("green")
  endBlock();
  rotate([0,0,180])
  endBlock();
  
  // heater
  color("red")
  translate([0,0,0.2+3])
  cube([250,220,0.4],center=true);


  x1=12;    
if(1){
  // reels
  translate([x1,0,z0])
  rotate([0,90,0])
  reelPlus();
}
if(1){
  translate([-x1,0,z0])
  mirror([1,0,0])
  rotate([0,90,0])
  reelPlus();
}
  
  
}

//---------------------------------------------------------------------------
module centerBlock(){
x0=280;
y0=230;
z0=110;
c0=40;

z1=2*z0;

  
    difference(){
    union(){
      translate([0,0,z0+1.5-c0/2+10])
      cube([10,24,13+10],center=true);

      translate([0,0,z0+1.5-c0/2+21.5])
      rotate([90,0,0])
      cylinder(r=5,h=24,center=true,$fn=99);
    }    
    translate([0,0,z0+1.5-c0/2-10])
    cube([3.2,y0-6,c0],center=true);
  }  

  translate([-5,8,z0+1.5-c0/2+8.5])
  rotate([90,0,0])
  rotate([0,0,180])
  bevel(x=7,y=10,h=16);

  translate([5,8,z0+1.5-c0/2+8.5])
  rotate([90,0,0])
  rotate([0,0,-90])
  bevel(x=10,y=7,h=16);
  
  translate([5,0,z0+1.5-c0/2+15])
  rotate([0,90,0])
  axleBoxA();

  translate([-5,0,z0+1.5-c0/2+15])
  rotate([0,0,180])
  rotate([0,90,0])
  axleBoxA();

}

  
//---------------------------------------------------------------------------
module endBlock(){
x0=280;
y0=230;
z0=110;
c0=40;

z1=2*z0;

  difference(){
    translate([x0/2-10,0,z0+1.5-c0/2+18])
    cube([14,24,18],center=true);

    hull(){
      translate([x0/2-10,0,z0+1.5-c0/2+18])
      rotate([0,90,0])
      cylinder(r=7.6/2,h=15,center=true,$fn=99);

      translate([x0/2-10,0,z0+1.5-c0/2+18+16])
      rotate([0,90,0])
      cylinder(r=7.6/2,h=15,center=true,$fn=99);
    }
    
    translate([x0/2-10-1.2,0,z0+1.5-c0/2+18+17])
    rotate([45,0,0])
    cube([14,20,20],center=true);
  }

  difference(){
    translate([x0/2-4+0.4,0,z0+1.5-c0/2+18])
    cube([1.2,36,28],center=true);
   
    translate([x0/2-4,0,z0+1.5-c0/2+18])
    rotate([0,90,0])
    cylinder(r=2,h=15,center=true,$fn=99);
  }

  translate([x0/2-1.2-3,12,z0+1.5-11])
  rotate([90,0,0])
  rotate([0,0,180])
  rounder(r=5,h=24,f=99);

}


//----------------------------------------------------------------------------------
// 12" x 12" x 3mm blanks = 304.8 mm x 304.8 mm x 3 mm
// ??? Is there enough scrap from the box to make lips for the lid ?

module dryLid(){

  // top
  translate([-3,-3,220])
  cube([x0+6,y0+6,3]);

  // left side
  translate([-3,-3,220-33])
  cube([3,y0+6,30]);

if(0){  
  // right side
  translate([x0-3,3,3])
  cube([3,y0-6,30]);
  
  // front side
  color("cyan")
  translate([0,0,3])
  cube([x0,3,30]);
  
  // back side
  color("green")
  translate([0,y0-3,3])
  cube([x0,3,30]);
}
  
}

//--------------------------------------------------------------------
// inner corners
module inner(){
  
u=25;
t=1.5;  
$fn=99;

intersection(){ 
  union(){
  difference(){ 
    cube([u,u,u]);
    
    translate([t,t,t])
    cube([u,u,u]);
    
    translate([u/2,u/2,0])
    cylinder(r=1.7,h=2*u,center=true);

    translate([u/2,0,u/2])
    rotate([90,0,0])
    cylinder(r=1.7,h=2*u,center=true);

    translate([0,u/2,u/2])
    rotate([0,90,0])
    cylinder(r=1.7,h=2*u,center=true);
  }
  
  translate([t,t,0])
  rounder(r=t,h=u,f=99);
  translate([t,u,t])
  rotate([90,0,0])
  rounder(r=t,h=u,f=99);
  translate([u,t,t])
  rotate([0,-90,0])
  rounder(r=t,h=u,f=99);
}

  sphere(u);
}
  
}

//--------------------------------------------------------------------
// outer corners
module outer(){
  
u=25;
t=1.5;  
$fn=99;

intersection(){ 
  union(){
  difference(){ 
    cube([u,u,u]);
    
    translate([t,t,t])
    cube([u,u,u]);
    
    translate([u/2,u/2,0])
    cylinder(r=1.7,h=2*u,center=true);

    translate([u/2,0,u/2])
    rotate([90,0,0])
    cylinder(r=1.7,h=2*u,center=true);

    translate([0,u/2,u/2])
    rotate([0,90,0])
    cylinder(r=1.7,h=2*u,center=true);

    rounder(r=t,h=u,f=99);
    translate([0,u,0])
    rotate([90,0,0])
    rounder(r=t,h=u,f=99);

    translate([u,0,0])
    rotate([0,-90,0])
    rounder(r=t,h=u,f=99);
  }
  
}

  sphere(u);
}
  
}

//--------------------------------------------------------------
module port(){

$fn=99;

tol=0.1;  
  
  // wall of drybox
  if(0){
    difference(){
      cube([3,30,30],center=true);
      rotate([0,90,0])
      cylinder(r=0.5*25.4/2,h=10,center=true);
    }
  }
  
  // plug
  difference(){
    
    union(){
      // main plug
      rotate([0,90,0])
      cylinder(r1=0.5*25.4/2-2*tol,r2=0.5*25.4/2-tol,h=3,center=true);

      // lip
      translate([1.5+0.5,0,0])
      rotate([0,90,0])
      cylinder(r1=0.7*25.4/2-tol,r2=0.7*25.4/2-3*tol,h=1,center=true);
    }
    
    // cut for tubing
    rotate([0,40,0])
    cylinder(r=2.15,h=20,center=true);
  }
  
}

//----------------------------------------------------------------
module blower2(){
  
  translate([26,26,0])
  cylinder(r=48/2,h=14.8);
  
  difference(){
    hull(){
      cube([19.5,3,14.8]);
      translate([2,26,0])
      cube([19.5,3,14.8]);
    }
      
    translate([1.3,-0.01,1.3])
    cube([19.5-2.6,3,14.8-2.6]);
  }
  difference(){
    hull(){
      translate([4.5,45,0])
      cylinder(r=6.7/2,h=14.8);
      translate([4.5+10,45-10,0])
      cylinder(r=6.7/2,h=14.8);
    }
    translate([4.5,45,-1])
    cylinder(r=4.5/2,h=16);
  }
  difference(){
    hull(){
      translate([47,7,0])
      cylinder(r=6.7/2,h=14.8);
      translate([47-10,7+10,0])
      cylinder(r=6.7/2,h=14.8);
    }
    translate([47,7,-1])
    cylinder(r=4.5/2,h=16);
  }
}
//----------------------------------------------------------------
module blowerBox(){

  // taper section
  difference(){
    hull(){
      translate([0,0,-8])
      cube([19.5,2,8]);

      translate([0,52,-8])
      cube([50,2,8]);
    }

    hull(){
      translate([1.3,-0.01,-8+1.3])
      cube([19.5-2.6,2,8-2.6]);

      translate([1.3,52.01,-8+1.3])
      cube([50-2.6,2,8-2.6]);
    }
  }

  // tab at backside
  translate([0,52.8,0])
  cube([50,1.2,4]);
  
  translate([0,52.8,0])
  rotate([0,90,0])
  rotate([0,0,180])
  rounder(r=3,h=50,f=88);
  
  // flow combiner section
  difference(){
    translate([0,-30,-8])
    cube([19.5,30,14.8+8]);

    translate([1.3,-30.1,-8+1.3])
    cube([19.5-2.6,30.2,14.8+8-2.6]);
  }

  // tab to center wall
  translate([19.5-1.3,-30.1,14.8])
  cube([1.3,30,10]);

}


//===============================
//color("silver")
//blower2();

//difference(){
 intersection(){

  blowerBox();
  
  translate([10,50+0.1,0])
  cube([100,100,100],center=true);

}

//port();

//inner();
//outer();

//centerBlock();
//endBlock();

//translate([-x2+90,yoff-220,30+z1+15]){
  //dryBox();
  //dryLid();
//}

//estop();

//translate([0,0,43])
//estop_topa();

//translate([0,0,43])
//estop_topb();

//color("green")
//estop_sup();

if(0){
color("red")
translate([0,0,36])
switch2();
}

//axleBoxP();

//reelBracket1();
//reelBracket2();

// reels
if(0){
  
translate([0,yoff-90,z1+150+3])
rotate([0,90,0])
reelPlus();

translate([-19.1,yoff-90,z1+150+3])
mirror([1,0,0])
rotate([0,90,0])
reelPlus();
}

// reel brackets
if(0){
translate([0,yoff-90,z1+130+3])
reelBracket3();

translate([110,yoff-90,z1+130+3])
reelBracket4();

color("green")
translate([-19.1,yoff-90,z1+130+3])
mirror([1,0,0])
reelBracket3();

color("green")
translate([-19.1-110,yoff-90,z1+130+3])
mirror([1,0,0])
reelBracket4();


}

// t-slot frame
//topshelf();

// radiator and pump
if(0){
translate([-x2+70,yoff-165,30+z1+20]){
  color("gray")
  radiator();
  color("green")
  radiatorBracket1();
  color("cyan")
  radiatorBracket2(); 
  color("orange")
  pump();
}
}

// Pi4 bracket case...
if(0){
translate([x2-70,-82,z1+60])
rotate([0,-90,180]){
translate([2,0,0]){
  post1();
  post2();
  pi4bracket();
}}

translate([x2-70,-82,z1+60])
rotate([0,-90,180]){
translate([58,112.75,-15])
rotate([0,180,90])
pi4case();
}}

// Duet bracket board...
if(0){
translate([x2-65,-82,z1+60])
rotate([0,-90,180]){
  duet3();
  duet3bracket();
  translate([0,140,0])
  mirror([0,1,0])
  duet3bracket();

}
}

//===============================
